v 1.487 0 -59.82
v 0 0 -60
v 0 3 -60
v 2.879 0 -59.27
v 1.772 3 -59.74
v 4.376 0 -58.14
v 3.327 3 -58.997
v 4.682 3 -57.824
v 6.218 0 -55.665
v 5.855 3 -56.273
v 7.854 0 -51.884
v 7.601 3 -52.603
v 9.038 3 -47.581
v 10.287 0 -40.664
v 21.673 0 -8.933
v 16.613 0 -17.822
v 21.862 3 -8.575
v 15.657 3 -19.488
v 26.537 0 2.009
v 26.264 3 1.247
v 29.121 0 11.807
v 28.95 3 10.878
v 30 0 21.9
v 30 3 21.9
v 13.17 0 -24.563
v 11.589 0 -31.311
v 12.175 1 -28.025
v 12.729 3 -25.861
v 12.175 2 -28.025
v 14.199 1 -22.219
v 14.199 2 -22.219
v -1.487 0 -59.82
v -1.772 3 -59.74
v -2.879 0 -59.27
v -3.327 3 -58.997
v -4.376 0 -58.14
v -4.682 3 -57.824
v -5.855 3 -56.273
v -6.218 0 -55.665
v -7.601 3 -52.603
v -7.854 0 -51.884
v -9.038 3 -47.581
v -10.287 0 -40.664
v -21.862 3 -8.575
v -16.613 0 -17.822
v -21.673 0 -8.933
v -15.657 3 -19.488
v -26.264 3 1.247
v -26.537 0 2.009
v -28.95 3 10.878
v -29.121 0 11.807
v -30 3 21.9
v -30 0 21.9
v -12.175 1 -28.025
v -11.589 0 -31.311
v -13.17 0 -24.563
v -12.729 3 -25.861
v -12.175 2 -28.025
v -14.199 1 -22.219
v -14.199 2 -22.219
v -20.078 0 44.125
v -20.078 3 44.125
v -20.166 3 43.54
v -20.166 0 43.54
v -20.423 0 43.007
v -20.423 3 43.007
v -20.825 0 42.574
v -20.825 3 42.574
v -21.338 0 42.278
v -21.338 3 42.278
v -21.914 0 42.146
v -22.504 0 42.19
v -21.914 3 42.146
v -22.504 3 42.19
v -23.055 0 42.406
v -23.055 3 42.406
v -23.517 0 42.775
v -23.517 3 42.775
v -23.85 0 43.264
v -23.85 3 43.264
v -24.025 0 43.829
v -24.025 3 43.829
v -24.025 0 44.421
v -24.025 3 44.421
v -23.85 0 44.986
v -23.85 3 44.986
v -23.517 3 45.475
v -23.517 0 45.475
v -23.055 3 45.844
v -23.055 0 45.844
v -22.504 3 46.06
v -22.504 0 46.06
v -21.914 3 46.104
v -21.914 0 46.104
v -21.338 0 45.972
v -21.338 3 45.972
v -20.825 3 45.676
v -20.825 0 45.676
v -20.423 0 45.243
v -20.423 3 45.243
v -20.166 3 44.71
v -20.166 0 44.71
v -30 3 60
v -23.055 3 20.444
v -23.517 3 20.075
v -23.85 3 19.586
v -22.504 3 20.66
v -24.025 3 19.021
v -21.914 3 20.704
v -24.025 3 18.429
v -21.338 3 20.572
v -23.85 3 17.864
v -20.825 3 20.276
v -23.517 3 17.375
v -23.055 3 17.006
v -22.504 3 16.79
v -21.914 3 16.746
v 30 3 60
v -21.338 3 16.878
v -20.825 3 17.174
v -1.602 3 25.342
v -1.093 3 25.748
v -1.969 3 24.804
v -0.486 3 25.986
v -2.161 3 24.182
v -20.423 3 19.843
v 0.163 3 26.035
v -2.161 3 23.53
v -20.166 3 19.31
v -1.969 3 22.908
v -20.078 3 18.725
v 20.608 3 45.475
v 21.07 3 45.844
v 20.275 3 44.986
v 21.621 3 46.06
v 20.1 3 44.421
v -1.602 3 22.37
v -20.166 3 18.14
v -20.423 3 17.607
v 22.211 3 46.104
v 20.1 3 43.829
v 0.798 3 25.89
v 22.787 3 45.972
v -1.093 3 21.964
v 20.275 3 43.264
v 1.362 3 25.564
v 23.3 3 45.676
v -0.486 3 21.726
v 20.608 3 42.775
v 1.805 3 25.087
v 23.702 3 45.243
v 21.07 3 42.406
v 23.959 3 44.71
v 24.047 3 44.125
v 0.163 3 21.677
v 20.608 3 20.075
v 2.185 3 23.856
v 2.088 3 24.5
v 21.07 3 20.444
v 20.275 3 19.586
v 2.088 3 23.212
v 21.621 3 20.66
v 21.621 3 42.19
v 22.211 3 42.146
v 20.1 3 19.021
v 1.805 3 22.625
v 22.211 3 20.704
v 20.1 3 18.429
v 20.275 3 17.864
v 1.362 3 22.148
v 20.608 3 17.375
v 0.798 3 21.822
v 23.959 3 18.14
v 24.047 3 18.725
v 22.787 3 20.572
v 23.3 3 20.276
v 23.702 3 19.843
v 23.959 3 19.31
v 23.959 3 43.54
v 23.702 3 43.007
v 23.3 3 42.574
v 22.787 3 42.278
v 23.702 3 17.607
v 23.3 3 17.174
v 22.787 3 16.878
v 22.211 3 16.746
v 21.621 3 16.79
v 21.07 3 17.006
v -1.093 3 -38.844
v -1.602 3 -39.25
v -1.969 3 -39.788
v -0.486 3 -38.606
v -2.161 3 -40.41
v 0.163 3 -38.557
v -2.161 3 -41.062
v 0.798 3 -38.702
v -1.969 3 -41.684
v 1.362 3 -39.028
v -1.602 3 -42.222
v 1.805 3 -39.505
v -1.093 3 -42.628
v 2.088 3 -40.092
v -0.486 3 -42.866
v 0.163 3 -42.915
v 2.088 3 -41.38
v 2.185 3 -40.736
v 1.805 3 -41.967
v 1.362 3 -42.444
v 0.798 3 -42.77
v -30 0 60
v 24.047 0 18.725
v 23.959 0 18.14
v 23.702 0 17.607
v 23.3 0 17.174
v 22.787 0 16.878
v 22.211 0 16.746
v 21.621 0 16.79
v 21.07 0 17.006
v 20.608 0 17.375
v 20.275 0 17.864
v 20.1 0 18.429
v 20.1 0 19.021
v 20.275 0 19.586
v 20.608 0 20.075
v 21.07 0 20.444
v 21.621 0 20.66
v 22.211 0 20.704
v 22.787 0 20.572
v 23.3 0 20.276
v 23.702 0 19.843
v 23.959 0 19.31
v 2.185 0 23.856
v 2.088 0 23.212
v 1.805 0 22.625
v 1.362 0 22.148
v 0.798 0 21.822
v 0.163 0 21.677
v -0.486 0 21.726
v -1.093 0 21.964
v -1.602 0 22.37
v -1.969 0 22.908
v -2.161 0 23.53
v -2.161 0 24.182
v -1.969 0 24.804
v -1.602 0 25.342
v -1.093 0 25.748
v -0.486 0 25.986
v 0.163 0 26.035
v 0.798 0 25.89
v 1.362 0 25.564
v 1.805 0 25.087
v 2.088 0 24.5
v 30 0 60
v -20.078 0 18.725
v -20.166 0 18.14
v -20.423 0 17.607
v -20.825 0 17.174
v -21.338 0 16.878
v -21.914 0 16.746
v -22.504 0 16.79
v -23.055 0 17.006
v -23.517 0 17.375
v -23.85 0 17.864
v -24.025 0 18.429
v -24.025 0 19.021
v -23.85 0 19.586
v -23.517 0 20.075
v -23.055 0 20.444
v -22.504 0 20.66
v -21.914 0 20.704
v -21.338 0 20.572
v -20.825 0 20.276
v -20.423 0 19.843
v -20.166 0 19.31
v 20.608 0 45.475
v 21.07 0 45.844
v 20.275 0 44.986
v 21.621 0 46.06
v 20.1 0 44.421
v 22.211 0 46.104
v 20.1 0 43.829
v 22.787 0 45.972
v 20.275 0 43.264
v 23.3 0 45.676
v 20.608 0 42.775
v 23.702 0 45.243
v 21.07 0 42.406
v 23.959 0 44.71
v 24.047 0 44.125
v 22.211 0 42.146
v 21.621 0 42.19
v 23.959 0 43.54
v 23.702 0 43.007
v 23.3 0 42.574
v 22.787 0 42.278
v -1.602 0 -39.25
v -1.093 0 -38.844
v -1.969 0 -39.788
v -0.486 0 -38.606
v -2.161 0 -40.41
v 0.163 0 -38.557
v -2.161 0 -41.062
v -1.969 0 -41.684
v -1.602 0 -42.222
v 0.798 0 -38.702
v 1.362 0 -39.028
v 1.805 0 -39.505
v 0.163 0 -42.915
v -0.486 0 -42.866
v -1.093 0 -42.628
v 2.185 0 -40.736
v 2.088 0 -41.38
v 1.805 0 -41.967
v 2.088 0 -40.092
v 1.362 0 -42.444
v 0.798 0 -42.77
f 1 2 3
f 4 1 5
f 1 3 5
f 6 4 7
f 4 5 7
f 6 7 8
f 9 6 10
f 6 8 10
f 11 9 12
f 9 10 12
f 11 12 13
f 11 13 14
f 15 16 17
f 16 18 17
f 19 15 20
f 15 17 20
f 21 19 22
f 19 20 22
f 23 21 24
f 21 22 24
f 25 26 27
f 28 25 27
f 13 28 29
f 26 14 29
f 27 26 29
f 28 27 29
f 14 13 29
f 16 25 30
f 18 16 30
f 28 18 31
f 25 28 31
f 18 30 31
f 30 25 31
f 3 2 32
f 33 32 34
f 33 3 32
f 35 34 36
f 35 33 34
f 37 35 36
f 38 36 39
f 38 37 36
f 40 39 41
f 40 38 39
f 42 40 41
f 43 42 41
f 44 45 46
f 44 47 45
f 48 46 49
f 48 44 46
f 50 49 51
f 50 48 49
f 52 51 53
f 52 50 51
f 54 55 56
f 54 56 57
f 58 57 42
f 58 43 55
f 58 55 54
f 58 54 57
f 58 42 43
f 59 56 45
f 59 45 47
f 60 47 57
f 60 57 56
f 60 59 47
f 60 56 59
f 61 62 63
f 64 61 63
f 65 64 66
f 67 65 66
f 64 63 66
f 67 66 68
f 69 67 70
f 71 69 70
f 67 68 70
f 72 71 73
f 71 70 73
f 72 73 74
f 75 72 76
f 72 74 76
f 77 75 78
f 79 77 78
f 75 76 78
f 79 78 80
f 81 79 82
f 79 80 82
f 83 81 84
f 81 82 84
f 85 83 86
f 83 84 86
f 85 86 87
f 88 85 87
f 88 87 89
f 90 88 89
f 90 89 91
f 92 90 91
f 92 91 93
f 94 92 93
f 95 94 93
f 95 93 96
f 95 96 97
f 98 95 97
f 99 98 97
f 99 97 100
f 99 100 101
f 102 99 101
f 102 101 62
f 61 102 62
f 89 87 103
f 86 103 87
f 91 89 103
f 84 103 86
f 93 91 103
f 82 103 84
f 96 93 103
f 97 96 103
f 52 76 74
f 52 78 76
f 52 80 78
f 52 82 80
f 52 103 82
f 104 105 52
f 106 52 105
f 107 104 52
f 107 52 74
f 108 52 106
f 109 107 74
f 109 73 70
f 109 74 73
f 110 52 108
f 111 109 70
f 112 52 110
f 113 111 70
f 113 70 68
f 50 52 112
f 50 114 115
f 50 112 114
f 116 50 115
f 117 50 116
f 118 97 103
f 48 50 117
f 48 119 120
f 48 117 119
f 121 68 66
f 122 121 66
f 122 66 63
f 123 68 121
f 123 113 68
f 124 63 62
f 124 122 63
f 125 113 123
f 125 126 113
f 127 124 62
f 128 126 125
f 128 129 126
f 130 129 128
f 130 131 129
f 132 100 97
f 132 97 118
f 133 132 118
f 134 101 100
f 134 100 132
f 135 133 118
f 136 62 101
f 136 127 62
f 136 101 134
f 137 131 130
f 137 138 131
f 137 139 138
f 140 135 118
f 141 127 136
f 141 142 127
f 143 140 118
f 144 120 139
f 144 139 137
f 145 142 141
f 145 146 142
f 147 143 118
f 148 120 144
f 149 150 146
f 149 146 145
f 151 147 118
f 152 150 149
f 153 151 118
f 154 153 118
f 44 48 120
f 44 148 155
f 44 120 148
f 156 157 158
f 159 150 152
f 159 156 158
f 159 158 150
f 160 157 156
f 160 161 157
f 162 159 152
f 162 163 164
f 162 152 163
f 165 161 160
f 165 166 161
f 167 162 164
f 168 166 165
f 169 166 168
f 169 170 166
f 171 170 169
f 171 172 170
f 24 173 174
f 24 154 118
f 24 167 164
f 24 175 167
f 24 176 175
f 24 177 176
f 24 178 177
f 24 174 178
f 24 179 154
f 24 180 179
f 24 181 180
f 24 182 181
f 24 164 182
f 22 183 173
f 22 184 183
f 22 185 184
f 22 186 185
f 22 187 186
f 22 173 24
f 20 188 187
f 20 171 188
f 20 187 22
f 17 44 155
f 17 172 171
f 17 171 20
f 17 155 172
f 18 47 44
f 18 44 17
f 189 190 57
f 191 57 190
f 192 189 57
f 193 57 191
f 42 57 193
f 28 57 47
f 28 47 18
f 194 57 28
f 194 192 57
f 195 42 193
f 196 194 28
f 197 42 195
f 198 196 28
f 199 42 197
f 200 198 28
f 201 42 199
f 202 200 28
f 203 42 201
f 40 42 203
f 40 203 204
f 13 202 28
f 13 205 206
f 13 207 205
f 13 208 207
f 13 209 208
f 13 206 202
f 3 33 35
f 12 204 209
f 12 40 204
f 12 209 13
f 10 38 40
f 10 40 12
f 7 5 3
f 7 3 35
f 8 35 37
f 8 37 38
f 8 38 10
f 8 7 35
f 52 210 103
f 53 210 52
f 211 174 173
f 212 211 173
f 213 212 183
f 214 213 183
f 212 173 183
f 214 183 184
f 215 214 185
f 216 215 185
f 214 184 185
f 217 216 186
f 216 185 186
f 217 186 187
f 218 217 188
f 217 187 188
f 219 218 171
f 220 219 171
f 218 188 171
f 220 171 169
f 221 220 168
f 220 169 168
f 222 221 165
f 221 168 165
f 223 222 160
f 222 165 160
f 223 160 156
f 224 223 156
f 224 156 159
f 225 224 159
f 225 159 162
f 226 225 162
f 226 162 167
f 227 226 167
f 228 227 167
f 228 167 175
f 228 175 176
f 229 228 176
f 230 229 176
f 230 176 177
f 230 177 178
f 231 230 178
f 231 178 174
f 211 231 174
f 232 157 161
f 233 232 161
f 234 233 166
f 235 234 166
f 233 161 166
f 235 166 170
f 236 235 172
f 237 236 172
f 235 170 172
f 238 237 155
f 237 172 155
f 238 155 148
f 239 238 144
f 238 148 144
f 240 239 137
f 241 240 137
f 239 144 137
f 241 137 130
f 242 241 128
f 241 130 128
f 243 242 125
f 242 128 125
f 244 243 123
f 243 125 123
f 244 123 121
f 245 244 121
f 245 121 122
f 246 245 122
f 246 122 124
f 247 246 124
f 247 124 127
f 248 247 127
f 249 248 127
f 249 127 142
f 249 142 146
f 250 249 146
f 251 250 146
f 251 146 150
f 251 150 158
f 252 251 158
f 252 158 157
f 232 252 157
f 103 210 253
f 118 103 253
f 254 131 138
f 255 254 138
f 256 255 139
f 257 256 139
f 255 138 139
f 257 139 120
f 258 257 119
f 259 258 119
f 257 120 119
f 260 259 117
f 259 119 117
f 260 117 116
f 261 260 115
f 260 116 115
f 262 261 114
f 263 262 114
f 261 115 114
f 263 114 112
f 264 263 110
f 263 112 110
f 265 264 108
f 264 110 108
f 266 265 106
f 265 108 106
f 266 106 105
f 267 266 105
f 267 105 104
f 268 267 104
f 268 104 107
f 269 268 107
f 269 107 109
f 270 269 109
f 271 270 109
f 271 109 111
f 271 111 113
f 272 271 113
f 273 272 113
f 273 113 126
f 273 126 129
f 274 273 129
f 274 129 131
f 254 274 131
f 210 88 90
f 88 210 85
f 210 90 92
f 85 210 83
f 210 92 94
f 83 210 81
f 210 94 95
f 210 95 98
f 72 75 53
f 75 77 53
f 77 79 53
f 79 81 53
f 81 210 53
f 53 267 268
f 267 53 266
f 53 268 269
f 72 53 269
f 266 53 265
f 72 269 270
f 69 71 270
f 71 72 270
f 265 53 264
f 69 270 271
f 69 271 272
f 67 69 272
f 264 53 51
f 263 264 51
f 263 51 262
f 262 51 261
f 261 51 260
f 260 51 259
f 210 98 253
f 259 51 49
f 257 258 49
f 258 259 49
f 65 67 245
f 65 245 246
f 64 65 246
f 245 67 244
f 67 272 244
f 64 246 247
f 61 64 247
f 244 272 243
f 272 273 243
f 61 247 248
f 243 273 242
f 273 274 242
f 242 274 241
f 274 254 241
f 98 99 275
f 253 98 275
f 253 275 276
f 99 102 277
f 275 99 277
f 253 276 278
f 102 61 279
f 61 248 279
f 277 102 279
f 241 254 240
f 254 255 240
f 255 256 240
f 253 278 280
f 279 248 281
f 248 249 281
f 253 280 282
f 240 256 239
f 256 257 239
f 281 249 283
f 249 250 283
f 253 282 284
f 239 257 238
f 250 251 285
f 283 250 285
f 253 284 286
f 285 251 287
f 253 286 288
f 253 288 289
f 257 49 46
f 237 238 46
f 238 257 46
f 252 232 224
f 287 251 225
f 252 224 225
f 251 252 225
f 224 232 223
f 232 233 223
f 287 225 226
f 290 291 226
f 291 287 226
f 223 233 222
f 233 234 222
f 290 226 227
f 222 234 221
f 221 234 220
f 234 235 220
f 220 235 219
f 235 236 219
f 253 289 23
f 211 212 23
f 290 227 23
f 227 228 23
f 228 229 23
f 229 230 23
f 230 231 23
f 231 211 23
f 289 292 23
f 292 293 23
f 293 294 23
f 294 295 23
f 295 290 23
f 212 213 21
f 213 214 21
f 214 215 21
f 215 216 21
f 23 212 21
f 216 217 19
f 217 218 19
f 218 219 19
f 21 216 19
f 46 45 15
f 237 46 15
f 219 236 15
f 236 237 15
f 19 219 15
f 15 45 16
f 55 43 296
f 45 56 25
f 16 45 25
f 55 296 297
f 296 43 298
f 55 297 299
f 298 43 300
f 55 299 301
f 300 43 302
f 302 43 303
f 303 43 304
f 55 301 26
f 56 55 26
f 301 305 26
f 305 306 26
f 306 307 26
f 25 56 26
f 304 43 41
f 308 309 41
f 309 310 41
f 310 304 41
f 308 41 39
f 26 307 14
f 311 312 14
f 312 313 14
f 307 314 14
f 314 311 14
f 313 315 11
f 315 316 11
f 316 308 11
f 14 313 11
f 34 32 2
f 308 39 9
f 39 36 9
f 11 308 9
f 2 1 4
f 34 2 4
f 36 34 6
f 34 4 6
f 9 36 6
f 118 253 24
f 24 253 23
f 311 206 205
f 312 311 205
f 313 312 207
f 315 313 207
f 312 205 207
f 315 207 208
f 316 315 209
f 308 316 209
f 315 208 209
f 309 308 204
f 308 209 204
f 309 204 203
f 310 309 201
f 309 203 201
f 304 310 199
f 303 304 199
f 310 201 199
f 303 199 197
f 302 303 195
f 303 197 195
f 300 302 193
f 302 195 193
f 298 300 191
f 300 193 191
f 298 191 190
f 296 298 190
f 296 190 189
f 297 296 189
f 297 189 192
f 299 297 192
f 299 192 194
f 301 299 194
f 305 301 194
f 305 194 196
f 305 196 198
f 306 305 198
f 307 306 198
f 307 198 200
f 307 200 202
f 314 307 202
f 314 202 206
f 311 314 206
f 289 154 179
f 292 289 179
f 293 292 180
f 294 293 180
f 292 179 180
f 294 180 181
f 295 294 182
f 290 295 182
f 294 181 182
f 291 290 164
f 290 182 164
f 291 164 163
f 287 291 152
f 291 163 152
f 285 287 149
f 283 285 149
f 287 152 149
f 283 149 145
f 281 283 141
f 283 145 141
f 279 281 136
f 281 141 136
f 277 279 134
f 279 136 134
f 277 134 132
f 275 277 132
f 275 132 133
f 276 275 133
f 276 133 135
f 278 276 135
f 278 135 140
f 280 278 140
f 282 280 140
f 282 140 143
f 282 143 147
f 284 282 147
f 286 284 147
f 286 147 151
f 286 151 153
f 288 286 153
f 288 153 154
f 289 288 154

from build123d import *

# Parameters (mm, degrees)
SKETCH1_W           = 60
SKETCH1_H           = 120
BOSS_EXTRUDE1_DEPTH = 3
SKETCH2_R           = 2.185
CUT_EXTRUDE1_DEPTH  = 4
CUT_EXTRUDE2_DEPTH  = 4
SKETCH4_R           = 1.984375
CUT_EXTRUDE3_DEPTH  = 4.0000001


with BuildPart() as part:
    # Sketch1 → Boss-Extrude1 (new body)
    with BuildSketch(Plane(origin=(0, 0, 0), x_dir=(1, 0, 0), z_dir=(0, 1, 0))):
        Rectangle(SKETCH1_W, SKETCH1_H)
    extrude(amount=BOSS_EXTRUDE1_DEPTH)

    # Sketch2 → Cut-Extrude1 (cut, through all)
    with BuildSketch(Plane(origin=(0, 3, 0), x_dir=(1, 0, 0), z_dir=(0, 1, 0))):
        with Locations((0, -23.856)):
            Circle(SKETCH2_R)
        with Locations((0, 40.736)):
            Circle(SKETCH2_R)
    extrude(amount=-CUT_EXTRUDE1_DEPTH, mode=Mode.SUBTRACT)

    # Sketch3 → Cut-Extrude2 (cut, through all)
    with BuildSketch(Plane(origin=(0, 3, 0), x_dir=(1, 0, 0), z_dir=(0, 1, 0))):
        with BuildLine():
            Line((30, -21.9), (30, 60))
            Line((30, 60), (0, 60))
            add(Edge.make_bspline(
                [(0, 60), (9.906897678, 60), (10.116738443, 32.51403174), (16.216386116, 16.253262419), (30, -0.686105814), (30, -21.9)],
                knots=[0, 0, 0, 0, 0.419462523, 0.519462523, 1, 1, 1, 1], degree=3))
        make_face()
    cut_extrude2 = extrude(amount=-CUT_EXTRUDE2_DEPTH, mode=Mode.SUBTRACT)

    # Mirror1: Cut-Extrude2 across plane
    add(cut_extrude2.mirror(Plane(origin=(0, 0, 0), x_dir=(0, 0, 1), z_dir=(1, 0, 0))), mode=Mode.SUBTRACT)

    # Sketch4 → Cut-Extrude3 (cut, through all)
    with BuildSketch(Plane(origin=(0, 3, 0), x_dir=(1, 0, 0), z_dir=(0, 1, 0))):
        with Locations((22.0625, -44.125)):
            Circle(SKETCH4_R)
        with Locations((22.0625, -18.725)):
            Circle(SKETCH4_R)
        with Locations((-22.0625, -18.725)):
            Circle(SKETCH4_R)
        with Locations((-22.0625, -44.125)):
            Circle(SKETCH4_R)
    extrude(amount=-CUT_EXTRUDE3_DEPTH, mode=Mode.SUBTRACT)


solid = part.part
